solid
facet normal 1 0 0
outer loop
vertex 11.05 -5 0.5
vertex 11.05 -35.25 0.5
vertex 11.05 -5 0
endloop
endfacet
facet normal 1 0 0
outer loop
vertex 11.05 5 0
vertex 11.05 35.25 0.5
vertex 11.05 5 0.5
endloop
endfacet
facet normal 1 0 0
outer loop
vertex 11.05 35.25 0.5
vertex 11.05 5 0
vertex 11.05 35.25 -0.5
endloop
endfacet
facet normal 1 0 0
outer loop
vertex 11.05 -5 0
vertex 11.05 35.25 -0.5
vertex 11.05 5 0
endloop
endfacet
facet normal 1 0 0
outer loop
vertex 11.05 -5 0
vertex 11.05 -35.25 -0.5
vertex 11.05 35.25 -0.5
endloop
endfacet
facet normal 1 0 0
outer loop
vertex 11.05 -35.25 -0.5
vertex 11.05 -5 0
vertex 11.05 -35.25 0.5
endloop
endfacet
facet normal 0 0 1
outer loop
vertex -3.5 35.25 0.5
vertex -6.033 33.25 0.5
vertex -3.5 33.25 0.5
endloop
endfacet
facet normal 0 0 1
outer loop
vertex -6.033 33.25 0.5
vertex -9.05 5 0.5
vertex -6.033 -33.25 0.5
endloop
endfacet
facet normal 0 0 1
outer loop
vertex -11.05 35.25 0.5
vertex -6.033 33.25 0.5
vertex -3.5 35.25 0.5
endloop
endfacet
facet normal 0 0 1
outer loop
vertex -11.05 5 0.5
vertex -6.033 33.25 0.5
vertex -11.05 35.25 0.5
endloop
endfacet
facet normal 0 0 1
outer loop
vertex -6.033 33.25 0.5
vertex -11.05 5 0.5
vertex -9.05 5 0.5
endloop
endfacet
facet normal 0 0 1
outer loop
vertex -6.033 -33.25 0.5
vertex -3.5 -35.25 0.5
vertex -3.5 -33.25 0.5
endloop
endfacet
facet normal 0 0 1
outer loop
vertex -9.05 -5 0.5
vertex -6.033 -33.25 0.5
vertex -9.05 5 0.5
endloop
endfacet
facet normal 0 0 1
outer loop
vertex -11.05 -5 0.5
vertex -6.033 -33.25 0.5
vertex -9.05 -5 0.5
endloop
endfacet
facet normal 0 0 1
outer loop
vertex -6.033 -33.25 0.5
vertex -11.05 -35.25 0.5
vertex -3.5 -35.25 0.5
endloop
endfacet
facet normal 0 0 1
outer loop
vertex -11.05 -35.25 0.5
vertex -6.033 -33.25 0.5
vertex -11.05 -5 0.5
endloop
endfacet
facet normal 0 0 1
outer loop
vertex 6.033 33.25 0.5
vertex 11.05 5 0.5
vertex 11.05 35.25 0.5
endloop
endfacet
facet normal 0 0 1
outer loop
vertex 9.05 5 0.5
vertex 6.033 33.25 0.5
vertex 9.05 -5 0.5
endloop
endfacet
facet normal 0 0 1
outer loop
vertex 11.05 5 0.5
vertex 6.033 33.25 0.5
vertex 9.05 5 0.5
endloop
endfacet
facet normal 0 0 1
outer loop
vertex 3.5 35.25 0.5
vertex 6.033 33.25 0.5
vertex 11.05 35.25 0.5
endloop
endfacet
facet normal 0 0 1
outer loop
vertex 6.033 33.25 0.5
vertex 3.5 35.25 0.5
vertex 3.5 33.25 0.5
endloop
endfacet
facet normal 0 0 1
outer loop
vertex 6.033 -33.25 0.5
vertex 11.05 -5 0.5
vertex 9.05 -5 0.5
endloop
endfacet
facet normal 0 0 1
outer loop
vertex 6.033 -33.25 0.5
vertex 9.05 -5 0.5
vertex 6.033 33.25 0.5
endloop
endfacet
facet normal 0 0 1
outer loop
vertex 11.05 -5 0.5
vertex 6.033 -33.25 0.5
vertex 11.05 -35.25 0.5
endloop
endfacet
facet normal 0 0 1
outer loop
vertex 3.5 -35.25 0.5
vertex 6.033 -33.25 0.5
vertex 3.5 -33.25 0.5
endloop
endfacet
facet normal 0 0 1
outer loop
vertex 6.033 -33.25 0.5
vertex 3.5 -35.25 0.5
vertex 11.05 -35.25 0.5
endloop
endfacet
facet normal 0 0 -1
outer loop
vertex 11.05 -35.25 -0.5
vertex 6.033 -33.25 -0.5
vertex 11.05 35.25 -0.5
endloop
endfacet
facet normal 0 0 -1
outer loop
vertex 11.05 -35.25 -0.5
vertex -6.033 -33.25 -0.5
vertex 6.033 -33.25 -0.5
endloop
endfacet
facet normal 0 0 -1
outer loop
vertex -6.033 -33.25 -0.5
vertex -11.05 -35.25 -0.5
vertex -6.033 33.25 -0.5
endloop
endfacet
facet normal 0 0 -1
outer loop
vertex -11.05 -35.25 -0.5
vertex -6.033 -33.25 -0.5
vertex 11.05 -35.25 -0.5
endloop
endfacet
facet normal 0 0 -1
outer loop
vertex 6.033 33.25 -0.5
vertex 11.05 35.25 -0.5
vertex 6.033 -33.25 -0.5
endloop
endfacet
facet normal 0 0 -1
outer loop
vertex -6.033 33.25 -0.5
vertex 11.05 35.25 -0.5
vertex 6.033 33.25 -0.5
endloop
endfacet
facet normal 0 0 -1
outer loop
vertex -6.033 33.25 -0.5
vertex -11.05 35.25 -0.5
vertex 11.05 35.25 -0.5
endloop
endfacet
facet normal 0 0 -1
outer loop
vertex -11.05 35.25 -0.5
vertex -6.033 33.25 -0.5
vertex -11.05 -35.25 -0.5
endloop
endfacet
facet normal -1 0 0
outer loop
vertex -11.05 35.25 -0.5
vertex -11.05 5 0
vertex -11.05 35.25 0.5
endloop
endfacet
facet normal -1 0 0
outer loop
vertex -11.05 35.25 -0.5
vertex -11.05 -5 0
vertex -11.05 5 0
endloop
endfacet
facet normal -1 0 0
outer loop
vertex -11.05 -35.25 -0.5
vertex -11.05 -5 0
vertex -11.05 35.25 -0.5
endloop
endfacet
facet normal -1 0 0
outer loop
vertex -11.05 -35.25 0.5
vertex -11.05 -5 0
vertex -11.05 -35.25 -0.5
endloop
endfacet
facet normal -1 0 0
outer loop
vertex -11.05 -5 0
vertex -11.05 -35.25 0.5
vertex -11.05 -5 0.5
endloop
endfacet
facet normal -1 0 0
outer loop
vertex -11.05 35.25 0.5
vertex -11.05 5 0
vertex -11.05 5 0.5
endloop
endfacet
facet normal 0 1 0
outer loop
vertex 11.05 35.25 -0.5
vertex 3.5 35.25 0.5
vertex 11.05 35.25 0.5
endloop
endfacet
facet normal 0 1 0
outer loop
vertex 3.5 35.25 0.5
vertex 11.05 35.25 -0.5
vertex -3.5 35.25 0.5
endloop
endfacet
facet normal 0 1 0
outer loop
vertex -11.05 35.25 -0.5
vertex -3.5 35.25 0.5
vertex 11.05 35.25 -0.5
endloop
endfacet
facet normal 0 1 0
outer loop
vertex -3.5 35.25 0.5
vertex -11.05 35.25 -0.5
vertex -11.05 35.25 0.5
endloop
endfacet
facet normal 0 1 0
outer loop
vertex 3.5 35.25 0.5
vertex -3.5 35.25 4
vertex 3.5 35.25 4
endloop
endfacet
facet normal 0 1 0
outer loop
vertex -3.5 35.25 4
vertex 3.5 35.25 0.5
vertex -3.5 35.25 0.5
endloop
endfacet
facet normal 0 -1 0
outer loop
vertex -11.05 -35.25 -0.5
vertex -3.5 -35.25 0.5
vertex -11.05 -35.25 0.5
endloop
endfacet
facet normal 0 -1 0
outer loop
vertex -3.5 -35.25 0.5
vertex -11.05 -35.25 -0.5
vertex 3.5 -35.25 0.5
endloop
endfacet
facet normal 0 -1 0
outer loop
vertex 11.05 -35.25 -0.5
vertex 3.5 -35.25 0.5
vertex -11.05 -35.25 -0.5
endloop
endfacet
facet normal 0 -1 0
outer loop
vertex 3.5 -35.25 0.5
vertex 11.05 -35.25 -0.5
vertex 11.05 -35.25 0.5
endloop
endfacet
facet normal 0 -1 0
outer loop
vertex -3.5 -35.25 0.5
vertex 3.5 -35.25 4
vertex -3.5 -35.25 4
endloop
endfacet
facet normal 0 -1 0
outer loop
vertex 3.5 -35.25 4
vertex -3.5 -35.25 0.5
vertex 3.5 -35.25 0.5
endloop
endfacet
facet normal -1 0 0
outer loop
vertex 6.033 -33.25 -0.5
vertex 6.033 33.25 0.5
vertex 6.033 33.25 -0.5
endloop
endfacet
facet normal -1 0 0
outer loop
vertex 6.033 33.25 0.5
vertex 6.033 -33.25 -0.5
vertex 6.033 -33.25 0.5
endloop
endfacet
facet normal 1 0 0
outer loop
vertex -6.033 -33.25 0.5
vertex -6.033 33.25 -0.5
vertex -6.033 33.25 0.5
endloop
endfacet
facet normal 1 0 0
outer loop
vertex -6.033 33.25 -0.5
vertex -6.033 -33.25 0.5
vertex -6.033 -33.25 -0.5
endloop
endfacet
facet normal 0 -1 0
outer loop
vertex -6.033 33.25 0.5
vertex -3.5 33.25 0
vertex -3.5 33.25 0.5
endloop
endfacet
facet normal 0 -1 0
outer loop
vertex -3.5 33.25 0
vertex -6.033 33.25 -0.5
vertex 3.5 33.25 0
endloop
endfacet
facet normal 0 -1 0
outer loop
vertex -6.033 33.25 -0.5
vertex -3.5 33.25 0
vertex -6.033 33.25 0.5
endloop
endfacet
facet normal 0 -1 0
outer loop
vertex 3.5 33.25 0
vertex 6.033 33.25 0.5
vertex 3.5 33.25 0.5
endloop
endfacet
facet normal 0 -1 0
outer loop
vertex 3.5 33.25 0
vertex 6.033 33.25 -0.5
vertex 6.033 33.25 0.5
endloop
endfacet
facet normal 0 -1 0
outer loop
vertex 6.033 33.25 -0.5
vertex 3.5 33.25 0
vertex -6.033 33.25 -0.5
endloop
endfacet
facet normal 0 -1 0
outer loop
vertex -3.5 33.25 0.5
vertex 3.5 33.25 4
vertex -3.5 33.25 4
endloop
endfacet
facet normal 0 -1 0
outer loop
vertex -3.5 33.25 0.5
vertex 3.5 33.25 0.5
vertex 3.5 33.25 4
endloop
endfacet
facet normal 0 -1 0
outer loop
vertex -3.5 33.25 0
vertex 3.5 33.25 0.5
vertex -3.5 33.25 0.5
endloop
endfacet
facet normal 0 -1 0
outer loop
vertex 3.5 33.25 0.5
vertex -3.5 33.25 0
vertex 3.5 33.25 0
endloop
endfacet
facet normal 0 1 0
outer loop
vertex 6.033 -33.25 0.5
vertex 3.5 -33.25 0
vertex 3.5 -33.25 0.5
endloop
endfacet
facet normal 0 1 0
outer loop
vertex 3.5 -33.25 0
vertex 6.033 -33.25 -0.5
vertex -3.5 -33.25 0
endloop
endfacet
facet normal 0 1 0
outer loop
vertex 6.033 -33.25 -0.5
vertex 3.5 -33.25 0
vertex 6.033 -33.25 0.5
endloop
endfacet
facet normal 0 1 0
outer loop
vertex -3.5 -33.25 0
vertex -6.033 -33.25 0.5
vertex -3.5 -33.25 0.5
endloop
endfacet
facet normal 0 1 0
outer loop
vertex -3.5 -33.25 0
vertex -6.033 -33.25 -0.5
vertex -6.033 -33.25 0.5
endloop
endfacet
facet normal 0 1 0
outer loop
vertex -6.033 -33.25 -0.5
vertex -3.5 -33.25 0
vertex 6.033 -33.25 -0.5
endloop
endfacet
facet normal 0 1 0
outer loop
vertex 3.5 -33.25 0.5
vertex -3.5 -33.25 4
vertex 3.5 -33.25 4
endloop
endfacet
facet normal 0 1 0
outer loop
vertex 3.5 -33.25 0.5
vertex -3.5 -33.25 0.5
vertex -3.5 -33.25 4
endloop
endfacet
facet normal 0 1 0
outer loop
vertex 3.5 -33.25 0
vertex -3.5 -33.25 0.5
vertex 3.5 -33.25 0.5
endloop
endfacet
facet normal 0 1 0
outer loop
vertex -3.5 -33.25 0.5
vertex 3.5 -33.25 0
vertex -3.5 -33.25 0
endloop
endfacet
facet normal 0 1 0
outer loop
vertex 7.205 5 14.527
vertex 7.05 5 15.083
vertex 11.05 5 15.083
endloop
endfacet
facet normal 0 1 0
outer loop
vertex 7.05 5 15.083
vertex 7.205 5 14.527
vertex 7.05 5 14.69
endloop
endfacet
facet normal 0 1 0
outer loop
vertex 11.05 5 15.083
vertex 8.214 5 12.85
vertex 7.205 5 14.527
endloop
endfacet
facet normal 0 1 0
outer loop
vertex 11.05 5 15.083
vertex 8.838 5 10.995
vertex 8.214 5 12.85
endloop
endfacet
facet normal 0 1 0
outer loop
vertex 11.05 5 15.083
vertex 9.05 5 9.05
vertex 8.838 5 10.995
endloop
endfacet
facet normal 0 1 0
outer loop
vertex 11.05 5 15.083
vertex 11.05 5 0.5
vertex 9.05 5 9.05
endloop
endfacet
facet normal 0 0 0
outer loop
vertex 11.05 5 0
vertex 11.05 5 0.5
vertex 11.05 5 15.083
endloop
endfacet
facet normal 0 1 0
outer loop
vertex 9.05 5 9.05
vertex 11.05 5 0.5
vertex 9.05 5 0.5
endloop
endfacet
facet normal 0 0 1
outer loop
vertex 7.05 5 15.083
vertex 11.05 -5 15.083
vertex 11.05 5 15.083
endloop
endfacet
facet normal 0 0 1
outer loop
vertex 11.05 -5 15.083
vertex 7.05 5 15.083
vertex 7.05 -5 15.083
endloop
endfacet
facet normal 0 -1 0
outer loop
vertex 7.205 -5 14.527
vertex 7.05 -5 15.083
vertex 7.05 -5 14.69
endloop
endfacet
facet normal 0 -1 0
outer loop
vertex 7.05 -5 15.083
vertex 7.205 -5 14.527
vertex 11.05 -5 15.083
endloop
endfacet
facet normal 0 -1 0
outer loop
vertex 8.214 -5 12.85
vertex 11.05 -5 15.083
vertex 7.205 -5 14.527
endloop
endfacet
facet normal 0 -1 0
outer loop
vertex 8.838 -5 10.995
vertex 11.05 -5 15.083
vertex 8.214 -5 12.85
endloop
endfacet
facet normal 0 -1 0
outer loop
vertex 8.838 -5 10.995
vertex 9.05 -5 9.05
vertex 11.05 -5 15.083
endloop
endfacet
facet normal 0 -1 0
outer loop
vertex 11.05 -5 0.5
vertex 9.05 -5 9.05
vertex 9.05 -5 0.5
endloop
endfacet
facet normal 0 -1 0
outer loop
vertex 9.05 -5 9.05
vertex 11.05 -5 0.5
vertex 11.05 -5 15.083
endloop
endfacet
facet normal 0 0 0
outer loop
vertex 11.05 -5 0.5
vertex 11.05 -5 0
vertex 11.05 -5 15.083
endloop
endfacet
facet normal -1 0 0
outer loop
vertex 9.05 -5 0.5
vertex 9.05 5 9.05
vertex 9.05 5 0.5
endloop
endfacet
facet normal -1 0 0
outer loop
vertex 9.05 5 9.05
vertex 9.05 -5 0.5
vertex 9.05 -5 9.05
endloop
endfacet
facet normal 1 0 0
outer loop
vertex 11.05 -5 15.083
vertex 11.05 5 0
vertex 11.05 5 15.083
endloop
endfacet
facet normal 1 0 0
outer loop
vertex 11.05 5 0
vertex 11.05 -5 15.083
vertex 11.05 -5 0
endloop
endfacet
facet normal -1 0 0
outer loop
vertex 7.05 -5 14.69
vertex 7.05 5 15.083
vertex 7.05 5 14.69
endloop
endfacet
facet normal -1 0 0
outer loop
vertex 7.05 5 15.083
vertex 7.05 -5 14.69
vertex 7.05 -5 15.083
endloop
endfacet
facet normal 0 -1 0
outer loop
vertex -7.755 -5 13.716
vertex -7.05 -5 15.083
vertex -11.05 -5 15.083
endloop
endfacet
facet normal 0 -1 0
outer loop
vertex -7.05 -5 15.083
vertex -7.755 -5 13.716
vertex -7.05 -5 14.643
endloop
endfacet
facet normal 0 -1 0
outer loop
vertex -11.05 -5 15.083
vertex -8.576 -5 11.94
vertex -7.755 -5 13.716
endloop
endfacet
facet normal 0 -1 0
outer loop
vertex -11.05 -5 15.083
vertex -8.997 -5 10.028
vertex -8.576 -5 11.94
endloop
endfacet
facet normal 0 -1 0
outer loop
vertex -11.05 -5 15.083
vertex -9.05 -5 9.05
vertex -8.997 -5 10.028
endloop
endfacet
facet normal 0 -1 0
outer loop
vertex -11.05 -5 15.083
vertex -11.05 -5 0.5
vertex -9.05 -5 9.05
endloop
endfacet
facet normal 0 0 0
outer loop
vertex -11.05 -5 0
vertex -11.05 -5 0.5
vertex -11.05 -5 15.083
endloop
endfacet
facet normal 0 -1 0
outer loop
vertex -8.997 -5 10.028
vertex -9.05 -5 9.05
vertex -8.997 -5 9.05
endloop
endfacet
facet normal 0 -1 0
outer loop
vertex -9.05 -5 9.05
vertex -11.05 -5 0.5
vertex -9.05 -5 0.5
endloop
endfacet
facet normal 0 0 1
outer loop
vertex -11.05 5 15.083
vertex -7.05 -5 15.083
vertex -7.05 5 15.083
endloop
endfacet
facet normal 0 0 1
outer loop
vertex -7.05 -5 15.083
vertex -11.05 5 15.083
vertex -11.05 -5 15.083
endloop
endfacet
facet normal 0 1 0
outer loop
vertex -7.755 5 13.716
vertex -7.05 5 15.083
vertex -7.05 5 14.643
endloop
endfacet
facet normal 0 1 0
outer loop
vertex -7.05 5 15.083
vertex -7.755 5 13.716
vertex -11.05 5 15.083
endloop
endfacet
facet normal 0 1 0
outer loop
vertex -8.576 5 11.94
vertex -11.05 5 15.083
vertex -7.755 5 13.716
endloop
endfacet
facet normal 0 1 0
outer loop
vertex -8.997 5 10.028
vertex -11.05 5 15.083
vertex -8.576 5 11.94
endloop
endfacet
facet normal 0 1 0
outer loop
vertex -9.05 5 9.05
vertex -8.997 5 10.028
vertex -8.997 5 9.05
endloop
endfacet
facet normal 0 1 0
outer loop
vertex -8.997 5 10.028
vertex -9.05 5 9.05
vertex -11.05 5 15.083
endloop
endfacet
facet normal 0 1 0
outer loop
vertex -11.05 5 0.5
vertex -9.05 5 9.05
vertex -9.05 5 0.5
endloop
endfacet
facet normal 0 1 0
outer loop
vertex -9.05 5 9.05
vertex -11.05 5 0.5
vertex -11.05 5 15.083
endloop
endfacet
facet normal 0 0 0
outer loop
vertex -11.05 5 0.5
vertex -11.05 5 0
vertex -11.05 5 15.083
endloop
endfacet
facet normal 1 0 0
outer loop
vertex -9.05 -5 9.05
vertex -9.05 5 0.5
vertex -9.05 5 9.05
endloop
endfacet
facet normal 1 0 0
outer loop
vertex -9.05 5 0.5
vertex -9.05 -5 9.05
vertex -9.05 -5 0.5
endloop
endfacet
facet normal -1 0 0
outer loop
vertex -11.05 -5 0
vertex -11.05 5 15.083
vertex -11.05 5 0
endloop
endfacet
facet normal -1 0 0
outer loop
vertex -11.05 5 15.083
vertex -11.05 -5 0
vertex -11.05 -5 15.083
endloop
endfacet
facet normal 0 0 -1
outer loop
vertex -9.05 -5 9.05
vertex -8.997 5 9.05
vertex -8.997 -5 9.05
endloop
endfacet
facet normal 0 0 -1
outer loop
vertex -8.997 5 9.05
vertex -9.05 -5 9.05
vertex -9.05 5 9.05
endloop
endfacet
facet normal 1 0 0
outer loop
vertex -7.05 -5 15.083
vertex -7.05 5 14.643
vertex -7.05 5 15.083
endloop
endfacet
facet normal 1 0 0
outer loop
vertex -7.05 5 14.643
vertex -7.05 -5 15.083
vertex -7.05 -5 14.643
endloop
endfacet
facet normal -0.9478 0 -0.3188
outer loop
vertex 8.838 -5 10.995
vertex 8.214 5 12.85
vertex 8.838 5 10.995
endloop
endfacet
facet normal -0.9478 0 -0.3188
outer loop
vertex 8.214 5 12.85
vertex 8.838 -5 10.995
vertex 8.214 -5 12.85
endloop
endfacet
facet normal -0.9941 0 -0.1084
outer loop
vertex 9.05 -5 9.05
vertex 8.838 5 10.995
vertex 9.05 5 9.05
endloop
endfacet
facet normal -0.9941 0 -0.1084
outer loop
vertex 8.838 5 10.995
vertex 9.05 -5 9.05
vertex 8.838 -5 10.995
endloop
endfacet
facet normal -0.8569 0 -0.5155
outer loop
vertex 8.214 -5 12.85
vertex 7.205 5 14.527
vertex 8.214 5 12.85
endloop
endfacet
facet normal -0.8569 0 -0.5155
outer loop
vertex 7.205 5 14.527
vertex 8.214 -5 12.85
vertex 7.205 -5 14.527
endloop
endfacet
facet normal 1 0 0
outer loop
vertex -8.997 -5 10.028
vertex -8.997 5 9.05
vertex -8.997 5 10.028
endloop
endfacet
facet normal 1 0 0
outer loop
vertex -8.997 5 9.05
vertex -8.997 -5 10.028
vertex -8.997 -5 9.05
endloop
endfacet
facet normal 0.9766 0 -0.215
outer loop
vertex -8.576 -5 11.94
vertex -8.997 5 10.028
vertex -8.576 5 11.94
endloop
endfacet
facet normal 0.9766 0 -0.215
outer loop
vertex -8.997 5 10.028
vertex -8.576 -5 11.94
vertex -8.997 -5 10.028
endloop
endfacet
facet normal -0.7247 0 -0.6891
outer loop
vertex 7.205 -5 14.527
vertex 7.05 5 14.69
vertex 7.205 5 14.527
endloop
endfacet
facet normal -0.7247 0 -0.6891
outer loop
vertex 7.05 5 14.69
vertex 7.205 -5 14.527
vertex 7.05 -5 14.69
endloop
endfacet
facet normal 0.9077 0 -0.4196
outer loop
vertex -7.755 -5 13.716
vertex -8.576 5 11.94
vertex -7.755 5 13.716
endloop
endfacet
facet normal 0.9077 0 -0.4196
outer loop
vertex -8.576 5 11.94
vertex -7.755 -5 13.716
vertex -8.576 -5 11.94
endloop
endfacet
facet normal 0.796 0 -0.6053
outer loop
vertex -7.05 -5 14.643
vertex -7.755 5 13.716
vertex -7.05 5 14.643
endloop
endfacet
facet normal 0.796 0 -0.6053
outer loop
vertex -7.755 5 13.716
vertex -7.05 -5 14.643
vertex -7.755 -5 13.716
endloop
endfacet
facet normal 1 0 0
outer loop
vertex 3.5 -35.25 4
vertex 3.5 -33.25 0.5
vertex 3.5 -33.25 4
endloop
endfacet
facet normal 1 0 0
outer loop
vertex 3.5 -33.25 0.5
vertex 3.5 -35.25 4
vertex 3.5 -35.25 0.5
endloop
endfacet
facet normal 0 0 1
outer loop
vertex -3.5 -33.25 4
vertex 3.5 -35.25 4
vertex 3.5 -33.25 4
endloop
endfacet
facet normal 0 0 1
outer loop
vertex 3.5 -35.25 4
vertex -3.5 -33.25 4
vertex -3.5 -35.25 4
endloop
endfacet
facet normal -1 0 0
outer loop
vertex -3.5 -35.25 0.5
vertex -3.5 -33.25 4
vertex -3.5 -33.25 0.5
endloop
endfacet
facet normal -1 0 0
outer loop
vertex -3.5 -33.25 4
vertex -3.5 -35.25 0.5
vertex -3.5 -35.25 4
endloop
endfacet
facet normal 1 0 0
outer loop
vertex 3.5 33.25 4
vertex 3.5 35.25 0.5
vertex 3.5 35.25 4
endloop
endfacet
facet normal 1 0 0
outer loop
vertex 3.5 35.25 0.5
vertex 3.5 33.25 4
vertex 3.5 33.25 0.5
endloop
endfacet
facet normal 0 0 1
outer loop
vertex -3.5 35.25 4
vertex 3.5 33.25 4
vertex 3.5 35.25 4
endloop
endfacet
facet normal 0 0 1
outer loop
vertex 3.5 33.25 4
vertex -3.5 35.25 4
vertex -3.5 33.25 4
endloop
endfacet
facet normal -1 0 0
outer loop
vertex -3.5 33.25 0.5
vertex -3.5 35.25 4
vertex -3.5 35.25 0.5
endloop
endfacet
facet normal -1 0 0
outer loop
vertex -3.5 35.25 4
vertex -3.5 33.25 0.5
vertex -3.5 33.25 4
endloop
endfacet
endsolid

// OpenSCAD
length=66.5;
diam=18.1;
holderWidth=7;
standWidth=10;
baseThick=1;
wallThick=2;

margin=2;

difference() {
    cube([diam + 2* margin, length + 2 * margin, baseThick], true);
    cube([2*diam/3 , length, baseThick], true);
}

translate([-holderWidth/2, -length/2 - wallThick, 0]) {
    cube(size=[holderWidth, wallThick, 4]);  
} 
translate([-holderWidth/2, length/2, 0]) {
    cube(size=[holderWidth, wallThick, 4]);  
} 

difference() {
    union() {
        translate([diam/2+wallThick, -standWidth/2, 0]) rotate([0, 0, 90]) {
            holder();
        }

        translate([-diam/2-wallThick, standWidth/2, 0]) rotate([0, 0, -90]) {
            holder();
        }
    }
    #translate([0, length/2, diam/2]) rotate([90,0,0]) cylinder(d=diam, h=length);
}


module holder() {
    standHeight = 5*diam/6;
    cube(size=[standWidth, wallThick, standHeight]);
    translate([0, wallThick, diam/2]) {
        cube([standWidth, 2, standHeight - diam/2]);
    }
}
